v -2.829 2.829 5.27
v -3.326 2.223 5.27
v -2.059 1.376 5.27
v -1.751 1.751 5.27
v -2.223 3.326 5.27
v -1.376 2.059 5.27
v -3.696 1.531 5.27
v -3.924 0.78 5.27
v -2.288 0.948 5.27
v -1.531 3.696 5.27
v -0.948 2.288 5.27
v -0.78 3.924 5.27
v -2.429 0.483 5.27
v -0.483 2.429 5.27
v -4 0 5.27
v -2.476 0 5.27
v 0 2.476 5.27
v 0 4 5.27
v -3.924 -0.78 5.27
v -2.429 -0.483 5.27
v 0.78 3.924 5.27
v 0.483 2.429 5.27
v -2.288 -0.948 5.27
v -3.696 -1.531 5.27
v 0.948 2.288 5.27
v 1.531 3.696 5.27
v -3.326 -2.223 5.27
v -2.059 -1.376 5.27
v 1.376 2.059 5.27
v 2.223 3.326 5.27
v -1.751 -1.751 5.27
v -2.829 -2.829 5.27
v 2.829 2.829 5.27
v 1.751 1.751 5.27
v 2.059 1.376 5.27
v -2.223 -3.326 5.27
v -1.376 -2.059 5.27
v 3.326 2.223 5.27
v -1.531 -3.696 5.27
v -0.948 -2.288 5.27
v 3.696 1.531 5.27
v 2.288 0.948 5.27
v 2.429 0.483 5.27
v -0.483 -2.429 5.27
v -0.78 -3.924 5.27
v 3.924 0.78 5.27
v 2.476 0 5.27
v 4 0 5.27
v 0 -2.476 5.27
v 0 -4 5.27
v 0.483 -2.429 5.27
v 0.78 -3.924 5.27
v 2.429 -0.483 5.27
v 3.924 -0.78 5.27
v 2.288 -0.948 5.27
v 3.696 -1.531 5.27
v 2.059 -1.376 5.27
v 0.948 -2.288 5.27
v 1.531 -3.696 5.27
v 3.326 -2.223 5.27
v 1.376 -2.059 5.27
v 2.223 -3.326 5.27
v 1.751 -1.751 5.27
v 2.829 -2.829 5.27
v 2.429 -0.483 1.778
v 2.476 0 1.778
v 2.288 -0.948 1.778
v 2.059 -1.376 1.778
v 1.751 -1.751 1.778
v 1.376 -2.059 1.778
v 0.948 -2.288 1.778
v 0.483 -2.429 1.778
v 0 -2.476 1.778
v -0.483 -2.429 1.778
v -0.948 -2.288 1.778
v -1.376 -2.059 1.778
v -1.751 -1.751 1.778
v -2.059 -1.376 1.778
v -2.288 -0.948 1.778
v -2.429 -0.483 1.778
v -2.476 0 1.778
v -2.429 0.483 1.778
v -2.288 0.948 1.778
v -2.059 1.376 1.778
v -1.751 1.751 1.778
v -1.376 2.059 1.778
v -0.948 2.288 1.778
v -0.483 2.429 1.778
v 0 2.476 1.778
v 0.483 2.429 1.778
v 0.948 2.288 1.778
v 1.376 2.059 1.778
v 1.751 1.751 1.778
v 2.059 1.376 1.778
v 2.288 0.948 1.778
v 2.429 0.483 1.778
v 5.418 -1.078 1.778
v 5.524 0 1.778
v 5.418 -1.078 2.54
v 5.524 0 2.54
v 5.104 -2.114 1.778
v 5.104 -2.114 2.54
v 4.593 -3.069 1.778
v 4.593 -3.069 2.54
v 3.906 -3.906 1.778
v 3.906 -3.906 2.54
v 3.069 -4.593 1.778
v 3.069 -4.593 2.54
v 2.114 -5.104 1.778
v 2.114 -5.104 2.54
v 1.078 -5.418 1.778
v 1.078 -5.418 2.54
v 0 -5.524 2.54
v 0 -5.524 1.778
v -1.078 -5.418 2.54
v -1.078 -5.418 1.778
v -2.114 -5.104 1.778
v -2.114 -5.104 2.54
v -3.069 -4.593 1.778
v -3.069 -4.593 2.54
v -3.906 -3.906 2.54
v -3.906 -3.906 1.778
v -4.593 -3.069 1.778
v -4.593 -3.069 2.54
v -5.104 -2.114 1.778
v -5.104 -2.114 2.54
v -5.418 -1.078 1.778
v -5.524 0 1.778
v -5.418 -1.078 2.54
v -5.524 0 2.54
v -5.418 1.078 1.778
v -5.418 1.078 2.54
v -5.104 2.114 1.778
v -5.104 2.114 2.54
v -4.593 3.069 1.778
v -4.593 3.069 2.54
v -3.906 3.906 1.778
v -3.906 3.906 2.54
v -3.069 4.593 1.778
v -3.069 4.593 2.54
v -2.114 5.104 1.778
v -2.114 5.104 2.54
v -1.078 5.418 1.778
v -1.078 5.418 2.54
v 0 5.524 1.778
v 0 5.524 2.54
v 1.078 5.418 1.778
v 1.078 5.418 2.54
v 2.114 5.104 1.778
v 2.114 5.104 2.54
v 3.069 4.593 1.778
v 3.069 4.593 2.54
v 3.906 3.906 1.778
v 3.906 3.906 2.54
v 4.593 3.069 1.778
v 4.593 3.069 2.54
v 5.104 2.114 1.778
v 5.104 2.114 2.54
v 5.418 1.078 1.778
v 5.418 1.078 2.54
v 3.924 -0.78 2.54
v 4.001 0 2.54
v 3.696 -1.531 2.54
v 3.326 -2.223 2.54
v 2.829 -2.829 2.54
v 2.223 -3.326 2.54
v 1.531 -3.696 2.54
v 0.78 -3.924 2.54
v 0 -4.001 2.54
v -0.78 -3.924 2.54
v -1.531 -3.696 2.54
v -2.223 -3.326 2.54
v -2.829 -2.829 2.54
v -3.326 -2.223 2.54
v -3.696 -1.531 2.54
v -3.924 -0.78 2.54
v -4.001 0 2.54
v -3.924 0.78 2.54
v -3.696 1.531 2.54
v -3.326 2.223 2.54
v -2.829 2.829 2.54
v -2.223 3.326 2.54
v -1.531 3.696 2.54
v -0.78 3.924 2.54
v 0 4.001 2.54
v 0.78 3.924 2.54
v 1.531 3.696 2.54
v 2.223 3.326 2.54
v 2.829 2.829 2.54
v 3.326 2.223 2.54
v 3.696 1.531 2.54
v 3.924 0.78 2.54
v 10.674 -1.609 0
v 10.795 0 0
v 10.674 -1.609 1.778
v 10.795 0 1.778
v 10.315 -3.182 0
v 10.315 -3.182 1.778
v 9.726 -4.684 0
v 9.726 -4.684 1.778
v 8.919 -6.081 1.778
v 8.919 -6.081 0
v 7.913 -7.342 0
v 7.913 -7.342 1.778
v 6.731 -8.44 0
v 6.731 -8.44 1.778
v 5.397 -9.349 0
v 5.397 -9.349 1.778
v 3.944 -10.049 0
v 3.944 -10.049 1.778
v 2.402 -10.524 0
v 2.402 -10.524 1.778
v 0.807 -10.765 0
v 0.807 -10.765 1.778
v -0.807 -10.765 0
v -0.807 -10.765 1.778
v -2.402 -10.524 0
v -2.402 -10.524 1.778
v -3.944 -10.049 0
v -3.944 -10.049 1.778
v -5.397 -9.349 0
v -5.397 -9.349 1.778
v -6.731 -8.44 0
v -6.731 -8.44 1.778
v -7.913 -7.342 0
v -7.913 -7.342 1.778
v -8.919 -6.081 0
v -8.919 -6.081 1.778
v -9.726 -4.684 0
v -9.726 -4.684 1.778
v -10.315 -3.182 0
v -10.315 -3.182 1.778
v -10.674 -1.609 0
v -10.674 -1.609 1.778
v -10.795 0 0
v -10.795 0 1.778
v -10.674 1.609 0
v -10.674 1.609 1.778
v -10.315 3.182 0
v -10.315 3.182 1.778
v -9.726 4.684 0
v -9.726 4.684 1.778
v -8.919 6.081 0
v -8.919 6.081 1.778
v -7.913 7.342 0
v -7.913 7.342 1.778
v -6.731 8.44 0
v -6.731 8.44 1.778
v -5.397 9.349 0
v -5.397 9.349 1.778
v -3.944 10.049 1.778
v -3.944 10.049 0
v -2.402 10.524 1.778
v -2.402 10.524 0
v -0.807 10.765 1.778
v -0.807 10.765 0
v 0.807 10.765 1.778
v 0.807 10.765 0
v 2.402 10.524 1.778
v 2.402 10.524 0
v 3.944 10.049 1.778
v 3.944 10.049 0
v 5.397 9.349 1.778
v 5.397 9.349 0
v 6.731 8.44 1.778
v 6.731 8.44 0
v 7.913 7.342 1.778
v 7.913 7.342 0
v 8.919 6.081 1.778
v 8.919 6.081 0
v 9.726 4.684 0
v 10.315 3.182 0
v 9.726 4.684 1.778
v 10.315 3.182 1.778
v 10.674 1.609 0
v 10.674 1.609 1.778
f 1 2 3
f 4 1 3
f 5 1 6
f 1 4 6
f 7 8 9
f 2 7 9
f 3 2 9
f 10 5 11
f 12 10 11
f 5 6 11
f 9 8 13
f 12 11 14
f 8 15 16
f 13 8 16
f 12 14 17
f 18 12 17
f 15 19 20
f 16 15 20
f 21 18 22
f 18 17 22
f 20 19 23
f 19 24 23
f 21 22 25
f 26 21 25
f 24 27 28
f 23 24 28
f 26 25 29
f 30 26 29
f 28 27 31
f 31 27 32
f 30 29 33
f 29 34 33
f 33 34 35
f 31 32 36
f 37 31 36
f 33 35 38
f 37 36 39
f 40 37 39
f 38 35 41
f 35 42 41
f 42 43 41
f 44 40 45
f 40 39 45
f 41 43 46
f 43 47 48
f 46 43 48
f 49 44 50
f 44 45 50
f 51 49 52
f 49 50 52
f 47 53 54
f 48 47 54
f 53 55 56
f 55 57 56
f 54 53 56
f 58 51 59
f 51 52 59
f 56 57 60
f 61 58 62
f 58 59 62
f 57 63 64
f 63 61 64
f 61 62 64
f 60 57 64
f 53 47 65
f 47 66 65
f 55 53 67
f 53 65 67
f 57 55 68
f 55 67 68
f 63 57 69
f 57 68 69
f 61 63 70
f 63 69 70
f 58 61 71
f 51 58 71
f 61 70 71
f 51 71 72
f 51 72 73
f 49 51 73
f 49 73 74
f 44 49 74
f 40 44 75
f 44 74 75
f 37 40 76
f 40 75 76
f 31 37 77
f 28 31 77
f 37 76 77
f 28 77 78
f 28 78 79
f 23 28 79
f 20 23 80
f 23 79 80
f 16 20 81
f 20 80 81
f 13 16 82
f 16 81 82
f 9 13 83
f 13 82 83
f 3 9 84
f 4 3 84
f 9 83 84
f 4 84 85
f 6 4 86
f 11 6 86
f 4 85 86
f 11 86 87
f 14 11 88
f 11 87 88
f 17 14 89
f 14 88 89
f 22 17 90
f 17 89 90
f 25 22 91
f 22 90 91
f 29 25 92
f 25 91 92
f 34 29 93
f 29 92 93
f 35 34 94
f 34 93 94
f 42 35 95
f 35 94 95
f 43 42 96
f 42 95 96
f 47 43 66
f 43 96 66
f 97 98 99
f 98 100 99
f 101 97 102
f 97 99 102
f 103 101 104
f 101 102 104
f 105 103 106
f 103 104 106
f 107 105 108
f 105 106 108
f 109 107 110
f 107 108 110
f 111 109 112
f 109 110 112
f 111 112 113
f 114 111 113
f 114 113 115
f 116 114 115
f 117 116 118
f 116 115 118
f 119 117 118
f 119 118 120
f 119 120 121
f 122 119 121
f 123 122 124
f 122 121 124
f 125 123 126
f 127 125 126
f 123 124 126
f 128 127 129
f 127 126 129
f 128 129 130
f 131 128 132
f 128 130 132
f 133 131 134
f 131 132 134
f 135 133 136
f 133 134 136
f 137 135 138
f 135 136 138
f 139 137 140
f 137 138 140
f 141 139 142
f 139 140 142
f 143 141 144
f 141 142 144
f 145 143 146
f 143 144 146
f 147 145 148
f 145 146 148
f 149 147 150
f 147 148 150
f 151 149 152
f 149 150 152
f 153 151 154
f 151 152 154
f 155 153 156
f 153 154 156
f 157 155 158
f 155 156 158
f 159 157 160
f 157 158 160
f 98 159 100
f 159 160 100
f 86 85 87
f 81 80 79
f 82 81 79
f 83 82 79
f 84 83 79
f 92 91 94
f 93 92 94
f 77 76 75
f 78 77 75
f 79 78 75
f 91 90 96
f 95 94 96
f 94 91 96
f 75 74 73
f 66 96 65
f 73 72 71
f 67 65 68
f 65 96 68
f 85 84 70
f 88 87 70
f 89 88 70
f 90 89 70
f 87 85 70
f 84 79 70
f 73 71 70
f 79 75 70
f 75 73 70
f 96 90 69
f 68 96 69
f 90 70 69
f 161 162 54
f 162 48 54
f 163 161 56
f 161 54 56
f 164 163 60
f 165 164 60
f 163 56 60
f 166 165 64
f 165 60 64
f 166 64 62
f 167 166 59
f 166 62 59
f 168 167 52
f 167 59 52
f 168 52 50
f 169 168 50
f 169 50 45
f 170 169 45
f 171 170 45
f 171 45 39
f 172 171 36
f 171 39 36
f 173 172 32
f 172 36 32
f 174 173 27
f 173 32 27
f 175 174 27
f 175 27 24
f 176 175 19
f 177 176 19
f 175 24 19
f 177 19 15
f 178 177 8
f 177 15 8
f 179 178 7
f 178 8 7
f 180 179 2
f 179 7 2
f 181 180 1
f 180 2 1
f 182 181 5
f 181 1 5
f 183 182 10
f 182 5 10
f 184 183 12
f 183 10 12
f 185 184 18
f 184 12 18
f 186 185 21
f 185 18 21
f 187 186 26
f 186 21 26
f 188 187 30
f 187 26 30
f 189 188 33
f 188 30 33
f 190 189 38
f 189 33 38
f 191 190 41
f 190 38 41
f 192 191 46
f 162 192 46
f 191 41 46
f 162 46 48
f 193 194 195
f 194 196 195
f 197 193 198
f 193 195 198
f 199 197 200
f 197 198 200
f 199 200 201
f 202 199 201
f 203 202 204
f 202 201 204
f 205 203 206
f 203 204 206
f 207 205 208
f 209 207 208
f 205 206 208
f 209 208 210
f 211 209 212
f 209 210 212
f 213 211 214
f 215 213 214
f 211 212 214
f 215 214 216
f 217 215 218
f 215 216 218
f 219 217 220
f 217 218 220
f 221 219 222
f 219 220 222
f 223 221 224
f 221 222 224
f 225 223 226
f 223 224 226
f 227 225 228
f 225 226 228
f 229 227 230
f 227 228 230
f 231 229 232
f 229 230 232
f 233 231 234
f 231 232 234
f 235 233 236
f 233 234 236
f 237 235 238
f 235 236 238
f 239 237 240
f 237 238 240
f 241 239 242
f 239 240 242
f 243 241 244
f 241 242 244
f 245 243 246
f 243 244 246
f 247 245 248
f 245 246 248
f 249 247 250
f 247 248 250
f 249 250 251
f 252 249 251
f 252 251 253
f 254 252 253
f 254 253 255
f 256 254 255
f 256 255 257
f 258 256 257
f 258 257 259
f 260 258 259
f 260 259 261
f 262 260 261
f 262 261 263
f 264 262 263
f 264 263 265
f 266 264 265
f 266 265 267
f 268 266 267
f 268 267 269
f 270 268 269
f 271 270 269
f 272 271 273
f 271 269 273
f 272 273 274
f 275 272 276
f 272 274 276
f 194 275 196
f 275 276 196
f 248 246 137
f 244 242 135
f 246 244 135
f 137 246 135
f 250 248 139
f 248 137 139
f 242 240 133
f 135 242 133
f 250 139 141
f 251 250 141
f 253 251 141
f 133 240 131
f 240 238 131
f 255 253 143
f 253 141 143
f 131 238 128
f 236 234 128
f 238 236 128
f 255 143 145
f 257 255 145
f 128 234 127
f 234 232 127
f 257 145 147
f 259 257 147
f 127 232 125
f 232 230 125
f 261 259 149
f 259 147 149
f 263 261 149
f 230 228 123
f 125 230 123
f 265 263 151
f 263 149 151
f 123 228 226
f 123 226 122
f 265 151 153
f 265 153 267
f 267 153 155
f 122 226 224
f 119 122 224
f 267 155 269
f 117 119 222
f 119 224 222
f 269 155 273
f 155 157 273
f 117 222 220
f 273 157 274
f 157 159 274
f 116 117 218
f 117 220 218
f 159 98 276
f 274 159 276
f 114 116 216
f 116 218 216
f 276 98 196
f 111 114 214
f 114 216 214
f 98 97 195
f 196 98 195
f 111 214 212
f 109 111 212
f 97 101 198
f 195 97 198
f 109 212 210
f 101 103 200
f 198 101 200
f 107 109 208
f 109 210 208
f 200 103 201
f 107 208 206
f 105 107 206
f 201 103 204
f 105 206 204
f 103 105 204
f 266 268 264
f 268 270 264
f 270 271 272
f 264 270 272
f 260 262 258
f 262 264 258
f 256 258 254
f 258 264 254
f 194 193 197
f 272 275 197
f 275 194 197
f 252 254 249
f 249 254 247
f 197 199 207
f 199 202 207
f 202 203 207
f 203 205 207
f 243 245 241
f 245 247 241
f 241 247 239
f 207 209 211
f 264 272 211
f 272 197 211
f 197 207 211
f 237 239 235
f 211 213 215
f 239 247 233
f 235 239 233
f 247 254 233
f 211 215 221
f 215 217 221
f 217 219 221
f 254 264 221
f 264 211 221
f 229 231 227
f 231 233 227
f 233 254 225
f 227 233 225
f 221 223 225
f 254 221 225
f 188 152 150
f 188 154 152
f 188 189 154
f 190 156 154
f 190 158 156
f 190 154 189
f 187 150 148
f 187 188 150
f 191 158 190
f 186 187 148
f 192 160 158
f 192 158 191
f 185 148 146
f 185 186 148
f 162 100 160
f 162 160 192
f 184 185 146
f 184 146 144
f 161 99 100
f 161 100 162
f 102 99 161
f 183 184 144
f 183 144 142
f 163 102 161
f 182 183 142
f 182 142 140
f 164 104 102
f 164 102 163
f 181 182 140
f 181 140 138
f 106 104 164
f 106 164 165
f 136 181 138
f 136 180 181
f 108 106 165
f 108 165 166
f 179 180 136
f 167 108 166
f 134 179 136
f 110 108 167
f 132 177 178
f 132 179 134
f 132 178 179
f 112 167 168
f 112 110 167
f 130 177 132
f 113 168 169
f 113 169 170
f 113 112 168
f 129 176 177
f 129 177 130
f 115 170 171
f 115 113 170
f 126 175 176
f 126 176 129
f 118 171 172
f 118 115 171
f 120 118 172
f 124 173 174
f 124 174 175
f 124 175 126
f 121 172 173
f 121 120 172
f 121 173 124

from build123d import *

# Parameters (mm, degrees)
F0_W = 1.524
F0_H = 0.762


with BuildPart() as f1:
    # F0 (on Front) → F1 (revolve)
    with BuildSketch(Plane.XZ):
        Polygon((0, 1.778), (0, 0), (10.795, 0), (10.795, 1.778), (5.5245, 1.778), (4.0005, 1.778), (4.0005, 2.54), (4.0005, 5.2705), (2.4765, 5.2705), (2.4765, 1.778), align=None)
        with Locations((4.7625, 2.159)):
            Rectangle(F0_W, F0_H)
    revolve(axis=Axis((0, 0, 13.315846), (0, 0, -1)))


solid = f1.part
